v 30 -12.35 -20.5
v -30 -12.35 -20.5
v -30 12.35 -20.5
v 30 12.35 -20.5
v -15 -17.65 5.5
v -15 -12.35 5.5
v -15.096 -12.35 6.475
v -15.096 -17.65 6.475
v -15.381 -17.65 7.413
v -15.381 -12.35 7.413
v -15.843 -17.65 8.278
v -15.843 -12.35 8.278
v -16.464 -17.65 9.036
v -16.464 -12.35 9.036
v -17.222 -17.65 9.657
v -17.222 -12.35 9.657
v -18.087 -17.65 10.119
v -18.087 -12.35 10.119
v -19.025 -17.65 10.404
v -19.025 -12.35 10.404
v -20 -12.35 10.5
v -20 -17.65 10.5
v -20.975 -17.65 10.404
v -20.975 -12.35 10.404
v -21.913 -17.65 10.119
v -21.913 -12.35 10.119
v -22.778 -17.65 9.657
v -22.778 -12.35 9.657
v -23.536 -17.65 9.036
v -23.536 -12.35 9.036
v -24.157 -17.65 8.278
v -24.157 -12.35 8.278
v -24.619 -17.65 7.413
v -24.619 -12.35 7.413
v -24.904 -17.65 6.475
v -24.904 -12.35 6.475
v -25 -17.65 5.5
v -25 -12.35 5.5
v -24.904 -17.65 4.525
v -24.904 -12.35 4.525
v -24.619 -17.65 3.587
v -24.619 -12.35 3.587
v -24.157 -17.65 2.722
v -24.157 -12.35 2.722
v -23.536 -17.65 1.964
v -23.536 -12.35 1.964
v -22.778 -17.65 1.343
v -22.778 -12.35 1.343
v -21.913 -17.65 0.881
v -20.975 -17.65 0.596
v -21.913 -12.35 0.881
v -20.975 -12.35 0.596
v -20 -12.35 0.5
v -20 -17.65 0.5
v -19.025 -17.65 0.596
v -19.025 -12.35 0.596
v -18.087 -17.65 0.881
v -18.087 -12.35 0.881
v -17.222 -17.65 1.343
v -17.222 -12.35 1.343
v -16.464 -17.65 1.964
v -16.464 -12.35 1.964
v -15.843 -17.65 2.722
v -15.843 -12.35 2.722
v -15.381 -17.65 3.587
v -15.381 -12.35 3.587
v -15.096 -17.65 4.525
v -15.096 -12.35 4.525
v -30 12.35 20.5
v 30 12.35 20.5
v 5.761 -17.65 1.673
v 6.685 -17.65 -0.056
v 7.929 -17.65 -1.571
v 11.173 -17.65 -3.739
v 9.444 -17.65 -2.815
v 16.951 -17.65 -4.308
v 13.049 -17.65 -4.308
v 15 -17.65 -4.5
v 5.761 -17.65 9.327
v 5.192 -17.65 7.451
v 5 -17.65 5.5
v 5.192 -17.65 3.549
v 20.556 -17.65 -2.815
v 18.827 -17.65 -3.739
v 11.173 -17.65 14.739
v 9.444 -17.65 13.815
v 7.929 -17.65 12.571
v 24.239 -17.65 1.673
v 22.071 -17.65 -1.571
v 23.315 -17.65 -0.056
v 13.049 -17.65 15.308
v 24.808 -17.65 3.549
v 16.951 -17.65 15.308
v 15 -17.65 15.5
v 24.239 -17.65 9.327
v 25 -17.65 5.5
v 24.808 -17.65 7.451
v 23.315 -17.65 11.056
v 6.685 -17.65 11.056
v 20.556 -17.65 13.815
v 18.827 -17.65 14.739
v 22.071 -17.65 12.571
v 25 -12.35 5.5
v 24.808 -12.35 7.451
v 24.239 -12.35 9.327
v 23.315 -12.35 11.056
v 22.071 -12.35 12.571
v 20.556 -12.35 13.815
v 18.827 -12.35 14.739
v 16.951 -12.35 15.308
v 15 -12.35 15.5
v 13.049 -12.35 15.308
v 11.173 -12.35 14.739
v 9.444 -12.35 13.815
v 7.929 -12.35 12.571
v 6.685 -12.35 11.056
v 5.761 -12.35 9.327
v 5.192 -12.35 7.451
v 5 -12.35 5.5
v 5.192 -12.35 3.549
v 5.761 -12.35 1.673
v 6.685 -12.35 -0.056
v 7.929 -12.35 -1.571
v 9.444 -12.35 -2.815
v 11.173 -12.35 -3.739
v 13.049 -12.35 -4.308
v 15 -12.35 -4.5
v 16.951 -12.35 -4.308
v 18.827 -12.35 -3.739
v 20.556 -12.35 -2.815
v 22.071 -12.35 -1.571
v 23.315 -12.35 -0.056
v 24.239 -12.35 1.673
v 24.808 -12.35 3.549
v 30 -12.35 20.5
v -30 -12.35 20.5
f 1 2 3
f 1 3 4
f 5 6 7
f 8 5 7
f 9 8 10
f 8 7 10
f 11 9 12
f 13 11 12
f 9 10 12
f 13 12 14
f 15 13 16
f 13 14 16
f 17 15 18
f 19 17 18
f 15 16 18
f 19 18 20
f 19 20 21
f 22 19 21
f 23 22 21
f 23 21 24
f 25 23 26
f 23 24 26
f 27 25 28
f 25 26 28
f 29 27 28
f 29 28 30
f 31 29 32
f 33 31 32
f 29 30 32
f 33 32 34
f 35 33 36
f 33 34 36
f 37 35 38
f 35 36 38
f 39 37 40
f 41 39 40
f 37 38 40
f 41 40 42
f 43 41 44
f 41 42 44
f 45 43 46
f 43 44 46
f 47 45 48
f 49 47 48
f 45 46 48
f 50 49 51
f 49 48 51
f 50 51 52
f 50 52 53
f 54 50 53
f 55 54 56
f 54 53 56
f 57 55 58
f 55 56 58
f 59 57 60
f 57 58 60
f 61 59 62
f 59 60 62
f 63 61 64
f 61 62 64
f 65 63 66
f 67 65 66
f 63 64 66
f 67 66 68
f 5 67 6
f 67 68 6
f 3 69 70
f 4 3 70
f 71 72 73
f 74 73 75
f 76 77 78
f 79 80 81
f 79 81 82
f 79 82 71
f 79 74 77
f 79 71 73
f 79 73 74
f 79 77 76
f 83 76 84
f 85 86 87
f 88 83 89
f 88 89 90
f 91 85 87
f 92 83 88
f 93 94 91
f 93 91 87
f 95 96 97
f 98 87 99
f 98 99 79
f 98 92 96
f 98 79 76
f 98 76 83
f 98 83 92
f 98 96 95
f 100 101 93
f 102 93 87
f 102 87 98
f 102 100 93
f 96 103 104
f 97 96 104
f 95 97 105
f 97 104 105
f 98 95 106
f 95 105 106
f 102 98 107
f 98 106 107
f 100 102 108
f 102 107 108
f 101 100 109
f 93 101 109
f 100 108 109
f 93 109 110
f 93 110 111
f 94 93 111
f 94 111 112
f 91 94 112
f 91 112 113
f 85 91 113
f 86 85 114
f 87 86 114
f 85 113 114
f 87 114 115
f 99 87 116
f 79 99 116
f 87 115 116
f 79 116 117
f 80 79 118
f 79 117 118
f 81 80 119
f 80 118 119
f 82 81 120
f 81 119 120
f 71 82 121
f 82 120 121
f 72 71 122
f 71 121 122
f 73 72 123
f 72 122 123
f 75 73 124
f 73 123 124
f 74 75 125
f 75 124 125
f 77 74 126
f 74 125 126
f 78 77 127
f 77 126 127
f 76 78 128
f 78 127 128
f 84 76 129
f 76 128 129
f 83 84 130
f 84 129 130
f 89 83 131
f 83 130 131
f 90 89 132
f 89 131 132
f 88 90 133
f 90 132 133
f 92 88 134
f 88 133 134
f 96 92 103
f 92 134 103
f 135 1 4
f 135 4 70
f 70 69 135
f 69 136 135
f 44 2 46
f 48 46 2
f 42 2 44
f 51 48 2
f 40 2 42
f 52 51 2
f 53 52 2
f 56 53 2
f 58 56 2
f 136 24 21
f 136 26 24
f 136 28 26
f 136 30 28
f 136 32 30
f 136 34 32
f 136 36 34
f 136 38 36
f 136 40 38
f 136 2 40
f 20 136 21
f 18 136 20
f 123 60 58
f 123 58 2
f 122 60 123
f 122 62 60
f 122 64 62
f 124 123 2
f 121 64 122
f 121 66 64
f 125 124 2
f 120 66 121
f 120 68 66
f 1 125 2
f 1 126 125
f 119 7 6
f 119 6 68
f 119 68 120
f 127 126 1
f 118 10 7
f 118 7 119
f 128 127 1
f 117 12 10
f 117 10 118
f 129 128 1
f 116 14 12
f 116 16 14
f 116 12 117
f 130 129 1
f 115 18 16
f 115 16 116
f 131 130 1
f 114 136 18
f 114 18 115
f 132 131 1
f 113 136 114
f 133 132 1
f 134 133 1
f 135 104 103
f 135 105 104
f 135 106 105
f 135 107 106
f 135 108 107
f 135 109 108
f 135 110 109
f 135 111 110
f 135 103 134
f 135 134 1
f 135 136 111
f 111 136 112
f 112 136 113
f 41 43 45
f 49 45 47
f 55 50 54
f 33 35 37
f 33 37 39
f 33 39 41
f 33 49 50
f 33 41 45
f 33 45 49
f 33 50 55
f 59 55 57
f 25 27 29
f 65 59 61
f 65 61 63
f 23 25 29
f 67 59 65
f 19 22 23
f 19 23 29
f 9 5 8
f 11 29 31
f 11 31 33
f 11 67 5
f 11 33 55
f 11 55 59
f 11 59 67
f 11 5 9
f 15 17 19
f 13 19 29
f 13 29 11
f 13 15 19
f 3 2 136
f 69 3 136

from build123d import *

# Parameters (mm, degrees)
F0_W     = 60
F0_H     = 41
F1_DEPTH = 12.35
F2_R     = 10
F2_R_2   = 5
F3_DEPTH = 5.3


with BuildPart() as f1:
    # F0 (on Front) → F1 (new body, symmetric)
    with BuildSketch(Plane.XZ):
        Rectangle(F0_W, F0_H)
    extrude(amount=F1_DEPTH, both=True)

    # F2 (on face) → F3 (join)
    with BuildSketch(Plane.XZ.offset(12.35)):
        with Locations((15, 5.5)):
            Circle(F2_R)
        with Locations((-20, 5.5)):
            Circle(F2_R_2)
    extrude(amount=F3_DEPTH)


solid = f1.part
